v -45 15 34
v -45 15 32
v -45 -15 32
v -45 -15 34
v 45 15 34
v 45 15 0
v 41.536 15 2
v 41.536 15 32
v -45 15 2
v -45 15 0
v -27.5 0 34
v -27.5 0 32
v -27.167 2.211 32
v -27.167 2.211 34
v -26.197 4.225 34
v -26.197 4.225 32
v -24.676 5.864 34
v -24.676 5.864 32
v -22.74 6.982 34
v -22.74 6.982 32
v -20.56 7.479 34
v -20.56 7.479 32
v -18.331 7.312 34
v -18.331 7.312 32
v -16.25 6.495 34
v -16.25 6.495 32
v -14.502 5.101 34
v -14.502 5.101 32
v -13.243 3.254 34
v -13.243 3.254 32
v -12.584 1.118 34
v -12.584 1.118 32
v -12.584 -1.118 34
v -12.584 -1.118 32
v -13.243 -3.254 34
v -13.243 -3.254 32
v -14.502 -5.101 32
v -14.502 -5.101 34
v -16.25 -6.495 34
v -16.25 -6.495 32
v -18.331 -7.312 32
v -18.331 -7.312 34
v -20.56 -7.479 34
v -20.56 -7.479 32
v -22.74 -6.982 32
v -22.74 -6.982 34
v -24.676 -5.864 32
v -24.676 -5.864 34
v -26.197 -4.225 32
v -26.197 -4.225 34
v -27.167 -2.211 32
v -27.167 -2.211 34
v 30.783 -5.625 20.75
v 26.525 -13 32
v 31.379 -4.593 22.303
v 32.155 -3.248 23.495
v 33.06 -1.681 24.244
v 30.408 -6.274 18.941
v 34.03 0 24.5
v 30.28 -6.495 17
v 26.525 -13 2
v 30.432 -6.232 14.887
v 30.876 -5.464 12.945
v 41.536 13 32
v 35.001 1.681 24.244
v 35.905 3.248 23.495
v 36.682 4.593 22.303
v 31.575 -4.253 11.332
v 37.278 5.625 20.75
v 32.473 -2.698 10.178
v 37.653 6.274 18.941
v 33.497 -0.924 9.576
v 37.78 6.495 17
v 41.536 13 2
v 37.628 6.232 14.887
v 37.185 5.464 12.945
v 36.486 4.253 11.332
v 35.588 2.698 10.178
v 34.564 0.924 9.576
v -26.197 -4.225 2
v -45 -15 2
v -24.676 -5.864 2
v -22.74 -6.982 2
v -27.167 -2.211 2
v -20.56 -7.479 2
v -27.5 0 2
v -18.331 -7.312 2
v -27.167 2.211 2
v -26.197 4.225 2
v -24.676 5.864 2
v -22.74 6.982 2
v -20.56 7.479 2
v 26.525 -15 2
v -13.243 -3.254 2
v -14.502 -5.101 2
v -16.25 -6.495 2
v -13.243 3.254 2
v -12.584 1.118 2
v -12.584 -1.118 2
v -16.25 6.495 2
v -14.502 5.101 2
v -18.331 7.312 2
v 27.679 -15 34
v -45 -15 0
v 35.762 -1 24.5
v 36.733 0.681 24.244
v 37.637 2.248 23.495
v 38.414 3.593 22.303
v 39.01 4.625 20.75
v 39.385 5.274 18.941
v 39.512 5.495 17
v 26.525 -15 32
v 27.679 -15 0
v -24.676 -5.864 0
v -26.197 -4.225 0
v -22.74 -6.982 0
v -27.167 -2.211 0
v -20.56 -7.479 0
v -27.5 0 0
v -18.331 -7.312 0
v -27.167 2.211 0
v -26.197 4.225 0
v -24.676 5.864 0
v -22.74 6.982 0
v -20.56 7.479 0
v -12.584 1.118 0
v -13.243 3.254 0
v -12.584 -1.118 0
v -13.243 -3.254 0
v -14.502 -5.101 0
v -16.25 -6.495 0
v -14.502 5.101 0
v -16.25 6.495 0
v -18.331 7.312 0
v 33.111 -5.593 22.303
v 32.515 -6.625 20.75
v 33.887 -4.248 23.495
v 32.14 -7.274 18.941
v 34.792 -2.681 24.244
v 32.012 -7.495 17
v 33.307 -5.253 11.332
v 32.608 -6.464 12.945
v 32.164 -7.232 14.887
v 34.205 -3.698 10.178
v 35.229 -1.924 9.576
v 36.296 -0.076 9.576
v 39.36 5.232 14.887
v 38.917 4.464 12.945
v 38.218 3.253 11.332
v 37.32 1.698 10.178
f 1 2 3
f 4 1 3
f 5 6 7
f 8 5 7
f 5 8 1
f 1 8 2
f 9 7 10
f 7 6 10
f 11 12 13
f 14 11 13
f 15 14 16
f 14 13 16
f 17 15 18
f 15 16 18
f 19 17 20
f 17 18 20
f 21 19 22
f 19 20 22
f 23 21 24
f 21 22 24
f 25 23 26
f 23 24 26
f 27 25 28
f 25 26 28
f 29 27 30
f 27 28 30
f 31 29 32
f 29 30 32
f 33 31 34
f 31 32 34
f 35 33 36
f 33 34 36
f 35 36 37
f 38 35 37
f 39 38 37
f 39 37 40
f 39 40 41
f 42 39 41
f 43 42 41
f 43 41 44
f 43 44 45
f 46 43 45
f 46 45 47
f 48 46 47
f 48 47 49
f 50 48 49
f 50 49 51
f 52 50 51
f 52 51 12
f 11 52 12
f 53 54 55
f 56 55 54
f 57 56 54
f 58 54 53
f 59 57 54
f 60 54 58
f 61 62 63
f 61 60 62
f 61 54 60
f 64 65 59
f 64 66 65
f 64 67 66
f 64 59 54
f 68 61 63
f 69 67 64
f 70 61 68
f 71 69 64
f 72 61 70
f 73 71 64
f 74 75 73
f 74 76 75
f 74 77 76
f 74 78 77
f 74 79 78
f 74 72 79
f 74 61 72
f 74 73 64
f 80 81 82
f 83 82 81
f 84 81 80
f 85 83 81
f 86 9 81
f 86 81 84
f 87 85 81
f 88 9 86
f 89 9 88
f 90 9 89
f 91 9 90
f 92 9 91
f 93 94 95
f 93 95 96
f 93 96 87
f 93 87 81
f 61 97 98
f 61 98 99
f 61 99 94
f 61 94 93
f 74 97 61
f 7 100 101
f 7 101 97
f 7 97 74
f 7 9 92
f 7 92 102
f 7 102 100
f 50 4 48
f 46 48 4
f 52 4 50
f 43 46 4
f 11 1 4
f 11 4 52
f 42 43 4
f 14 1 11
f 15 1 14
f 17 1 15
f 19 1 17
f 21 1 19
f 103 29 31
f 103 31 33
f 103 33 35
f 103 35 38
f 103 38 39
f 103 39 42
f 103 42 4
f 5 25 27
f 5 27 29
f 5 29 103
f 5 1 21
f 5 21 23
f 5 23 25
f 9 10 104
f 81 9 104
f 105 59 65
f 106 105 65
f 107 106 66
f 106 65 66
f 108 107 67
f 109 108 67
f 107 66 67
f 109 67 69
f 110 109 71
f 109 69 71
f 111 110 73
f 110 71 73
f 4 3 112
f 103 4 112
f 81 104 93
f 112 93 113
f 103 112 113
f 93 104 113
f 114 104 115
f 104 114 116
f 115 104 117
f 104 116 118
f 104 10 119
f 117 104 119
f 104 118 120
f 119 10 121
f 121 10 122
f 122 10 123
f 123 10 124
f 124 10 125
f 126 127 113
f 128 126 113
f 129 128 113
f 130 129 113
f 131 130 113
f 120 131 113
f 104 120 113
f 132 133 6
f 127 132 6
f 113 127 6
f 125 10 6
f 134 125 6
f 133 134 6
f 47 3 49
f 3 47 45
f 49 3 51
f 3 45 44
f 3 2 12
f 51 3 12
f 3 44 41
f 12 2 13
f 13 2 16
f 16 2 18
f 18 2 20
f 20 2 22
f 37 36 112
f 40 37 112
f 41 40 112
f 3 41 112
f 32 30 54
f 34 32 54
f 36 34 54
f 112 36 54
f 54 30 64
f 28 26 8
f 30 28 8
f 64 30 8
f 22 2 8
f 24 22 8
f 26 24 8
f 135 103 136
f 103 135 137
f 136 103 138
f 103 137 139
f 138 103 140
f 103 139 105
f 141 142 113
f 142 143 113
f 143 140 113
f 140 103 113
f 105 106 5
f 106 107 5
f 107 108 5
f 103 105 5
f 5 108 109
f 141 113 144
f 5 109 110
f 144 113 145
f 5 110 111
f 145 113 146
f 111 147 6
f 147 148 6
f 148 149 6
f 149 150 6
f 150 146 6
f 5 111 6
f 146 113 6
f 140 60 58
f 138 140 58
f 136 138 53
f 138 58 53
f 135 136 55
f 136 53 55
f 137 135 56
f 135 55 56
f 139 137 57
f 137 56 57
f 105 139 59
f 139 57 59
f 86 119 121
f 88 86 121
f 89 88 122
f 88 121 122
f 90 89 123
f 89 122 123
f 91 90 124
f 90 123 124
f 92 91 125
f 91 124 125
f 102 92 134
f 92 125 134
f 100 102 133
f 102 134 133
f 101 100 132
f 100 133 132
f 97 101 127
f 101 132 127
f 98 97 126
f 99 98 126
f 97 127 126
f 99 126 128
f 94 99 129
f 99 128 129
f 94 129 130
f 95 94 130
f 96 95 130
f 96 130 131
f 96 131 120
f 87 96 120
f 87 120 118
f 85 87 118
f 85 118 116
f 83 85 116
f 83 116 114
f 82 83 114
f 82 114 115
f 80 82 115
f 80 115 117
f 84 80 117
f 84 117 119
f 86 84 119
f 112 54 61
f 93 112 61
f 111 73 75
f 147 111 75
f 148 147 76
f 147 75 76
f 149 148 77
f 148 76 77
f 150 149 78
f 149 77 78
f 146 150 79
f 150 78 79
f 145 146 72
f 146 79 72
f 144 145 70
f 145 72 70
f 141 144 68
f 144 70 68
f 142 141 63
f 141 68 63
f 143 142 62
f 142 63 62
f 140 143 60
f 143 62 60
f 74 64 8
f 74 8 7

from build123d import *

# Parameters (mm, degrees)
RESSALTO_EXTRUS_O1_DEPTH = 34
CASCA1_T                 = -2
ESBO_O2_W                = 50
ESBO_O2_H                = 30
CORTE_EXTRUS_O1_DEPTH    = 50
ESBO_O3_R                = 7.5
CORTE_EXTRUS_O2_DEPTH    = 50
ESBO_O6_W                = 36.535898385
ESBO_O6_H                = 30
CORTE_EXTRUS_O5_DEPTH    = 2
ESBO_O7_W                = 21.524791386
ESBO_O7_H                = 30
CORTE_EXTRUS_O6_DEPTH    = 2
CORTE_EXTRUS_O7_DEPTH    = 2


with BuildPart() as part:
    # Esboço1 → Ressalto-extrusão1 (new body)
    with BuildSketch(Plane.XY):
        Polygon((27.679491924, -15), (45, 15), (-45, 15), (-45, -15), align=None)
    extrude(amount=RESSALTO_EXTRUS_O1_DEPTH)

    # Casca1
    casca1_openings = [part.faces().sort_by_distance(p)[0] for p in [
        (-45, 0, 17),
    ]]
    offset(amount=CASCA1_T, openings=casca1_openings, kind=Kind.INTERSECTION)

    # Esboço2 → Corte-extrusão1 (cut)
    with BuildSketch(Plane(origin=(0, 15, 0), x_dir=(1, 0, 0), z_dir=(0, 1, 0))):
        with Locations((-20, -17)):
            Rectangle(ESBO_O2_W, ESBO_O2_H)
    extrude(amount=-CORTE_EXTRUS_O1_DEPTH, mode=Mode.SUBTRACT)

    # Esboço3 → Corte-extrusão2 (cut)
    with BuildSketch(Plane(origin=(0, 0, 0), x_dir=(-1, 0, 0), z_dir=(0, 0, -1))):
        with Locations((20, 0)):
            Circle(ESBO_O3_R)
    extrude(amount=-CORTE_EXTRUS_O2_DEPTH, mode=Mode.SUBTRACT)

    # Esboço6 → Corte-extrusão5 (cut)
    with BuildSketch(Plane(origin=(0, 13, 0), x_dir=(-1, 0, 0), z_dir=(0, -1, 0))):
        with Locations((-23.267949193, -17)):
            Rectangle(ESBO_O6_W, ESBO_O6_H)
    extrude(amount=-CORTE_EXTRUS_O5_DEPTH, mode=Mode.SUBTRACT)

    # Esboço7 → Corte-extrusão6 (cut)
    with BuildSketch(Plane(origin=(0, -13, 0), x_dir=(1, 0, 0), z_dir=(0, 1, 0))):
        with Locations((15.762395693, -17)):
            Rectangle(ESBO_O7_W, ESBO_O7_H)
    extrude(amount=-CORTE_EXTRUS_O6_DEPTH, mode=Mode.SUBTRACT)

    # Esboço8 → Corte-extrusão7 (cut)
    with BuildSketch(Plane(origin=(25.522758664, -14.735571585, 0), x_dir=(0, 0, 1), z_dir=(-0.86602540378444, 0.49999999999999784, 0))):
        with BuildLine():
            ThreePointArc((24.5, 17.015172443), (22.303300859, 22.318473302), (17, 24.515172443))
            Line((17, 24.515172443), (17, 9.515172443))
            ThreePointArc((17, 9.515172443), (22.303300859, 11.711871584), (24.5, 17.015172443))
        make_face()
        with BuildLine():
            Line((17, 9.515172443), (17, 24.515172443))
            ThreePointArc((17, 24.515172443), (9.5, 17.015172443), (17, 9.515172443))
        make_face()
    extrude(amount=-CORTE_EXTRUS_O7_DEPTH, mode=Mode.SUBTRACT)


solid = part.part
